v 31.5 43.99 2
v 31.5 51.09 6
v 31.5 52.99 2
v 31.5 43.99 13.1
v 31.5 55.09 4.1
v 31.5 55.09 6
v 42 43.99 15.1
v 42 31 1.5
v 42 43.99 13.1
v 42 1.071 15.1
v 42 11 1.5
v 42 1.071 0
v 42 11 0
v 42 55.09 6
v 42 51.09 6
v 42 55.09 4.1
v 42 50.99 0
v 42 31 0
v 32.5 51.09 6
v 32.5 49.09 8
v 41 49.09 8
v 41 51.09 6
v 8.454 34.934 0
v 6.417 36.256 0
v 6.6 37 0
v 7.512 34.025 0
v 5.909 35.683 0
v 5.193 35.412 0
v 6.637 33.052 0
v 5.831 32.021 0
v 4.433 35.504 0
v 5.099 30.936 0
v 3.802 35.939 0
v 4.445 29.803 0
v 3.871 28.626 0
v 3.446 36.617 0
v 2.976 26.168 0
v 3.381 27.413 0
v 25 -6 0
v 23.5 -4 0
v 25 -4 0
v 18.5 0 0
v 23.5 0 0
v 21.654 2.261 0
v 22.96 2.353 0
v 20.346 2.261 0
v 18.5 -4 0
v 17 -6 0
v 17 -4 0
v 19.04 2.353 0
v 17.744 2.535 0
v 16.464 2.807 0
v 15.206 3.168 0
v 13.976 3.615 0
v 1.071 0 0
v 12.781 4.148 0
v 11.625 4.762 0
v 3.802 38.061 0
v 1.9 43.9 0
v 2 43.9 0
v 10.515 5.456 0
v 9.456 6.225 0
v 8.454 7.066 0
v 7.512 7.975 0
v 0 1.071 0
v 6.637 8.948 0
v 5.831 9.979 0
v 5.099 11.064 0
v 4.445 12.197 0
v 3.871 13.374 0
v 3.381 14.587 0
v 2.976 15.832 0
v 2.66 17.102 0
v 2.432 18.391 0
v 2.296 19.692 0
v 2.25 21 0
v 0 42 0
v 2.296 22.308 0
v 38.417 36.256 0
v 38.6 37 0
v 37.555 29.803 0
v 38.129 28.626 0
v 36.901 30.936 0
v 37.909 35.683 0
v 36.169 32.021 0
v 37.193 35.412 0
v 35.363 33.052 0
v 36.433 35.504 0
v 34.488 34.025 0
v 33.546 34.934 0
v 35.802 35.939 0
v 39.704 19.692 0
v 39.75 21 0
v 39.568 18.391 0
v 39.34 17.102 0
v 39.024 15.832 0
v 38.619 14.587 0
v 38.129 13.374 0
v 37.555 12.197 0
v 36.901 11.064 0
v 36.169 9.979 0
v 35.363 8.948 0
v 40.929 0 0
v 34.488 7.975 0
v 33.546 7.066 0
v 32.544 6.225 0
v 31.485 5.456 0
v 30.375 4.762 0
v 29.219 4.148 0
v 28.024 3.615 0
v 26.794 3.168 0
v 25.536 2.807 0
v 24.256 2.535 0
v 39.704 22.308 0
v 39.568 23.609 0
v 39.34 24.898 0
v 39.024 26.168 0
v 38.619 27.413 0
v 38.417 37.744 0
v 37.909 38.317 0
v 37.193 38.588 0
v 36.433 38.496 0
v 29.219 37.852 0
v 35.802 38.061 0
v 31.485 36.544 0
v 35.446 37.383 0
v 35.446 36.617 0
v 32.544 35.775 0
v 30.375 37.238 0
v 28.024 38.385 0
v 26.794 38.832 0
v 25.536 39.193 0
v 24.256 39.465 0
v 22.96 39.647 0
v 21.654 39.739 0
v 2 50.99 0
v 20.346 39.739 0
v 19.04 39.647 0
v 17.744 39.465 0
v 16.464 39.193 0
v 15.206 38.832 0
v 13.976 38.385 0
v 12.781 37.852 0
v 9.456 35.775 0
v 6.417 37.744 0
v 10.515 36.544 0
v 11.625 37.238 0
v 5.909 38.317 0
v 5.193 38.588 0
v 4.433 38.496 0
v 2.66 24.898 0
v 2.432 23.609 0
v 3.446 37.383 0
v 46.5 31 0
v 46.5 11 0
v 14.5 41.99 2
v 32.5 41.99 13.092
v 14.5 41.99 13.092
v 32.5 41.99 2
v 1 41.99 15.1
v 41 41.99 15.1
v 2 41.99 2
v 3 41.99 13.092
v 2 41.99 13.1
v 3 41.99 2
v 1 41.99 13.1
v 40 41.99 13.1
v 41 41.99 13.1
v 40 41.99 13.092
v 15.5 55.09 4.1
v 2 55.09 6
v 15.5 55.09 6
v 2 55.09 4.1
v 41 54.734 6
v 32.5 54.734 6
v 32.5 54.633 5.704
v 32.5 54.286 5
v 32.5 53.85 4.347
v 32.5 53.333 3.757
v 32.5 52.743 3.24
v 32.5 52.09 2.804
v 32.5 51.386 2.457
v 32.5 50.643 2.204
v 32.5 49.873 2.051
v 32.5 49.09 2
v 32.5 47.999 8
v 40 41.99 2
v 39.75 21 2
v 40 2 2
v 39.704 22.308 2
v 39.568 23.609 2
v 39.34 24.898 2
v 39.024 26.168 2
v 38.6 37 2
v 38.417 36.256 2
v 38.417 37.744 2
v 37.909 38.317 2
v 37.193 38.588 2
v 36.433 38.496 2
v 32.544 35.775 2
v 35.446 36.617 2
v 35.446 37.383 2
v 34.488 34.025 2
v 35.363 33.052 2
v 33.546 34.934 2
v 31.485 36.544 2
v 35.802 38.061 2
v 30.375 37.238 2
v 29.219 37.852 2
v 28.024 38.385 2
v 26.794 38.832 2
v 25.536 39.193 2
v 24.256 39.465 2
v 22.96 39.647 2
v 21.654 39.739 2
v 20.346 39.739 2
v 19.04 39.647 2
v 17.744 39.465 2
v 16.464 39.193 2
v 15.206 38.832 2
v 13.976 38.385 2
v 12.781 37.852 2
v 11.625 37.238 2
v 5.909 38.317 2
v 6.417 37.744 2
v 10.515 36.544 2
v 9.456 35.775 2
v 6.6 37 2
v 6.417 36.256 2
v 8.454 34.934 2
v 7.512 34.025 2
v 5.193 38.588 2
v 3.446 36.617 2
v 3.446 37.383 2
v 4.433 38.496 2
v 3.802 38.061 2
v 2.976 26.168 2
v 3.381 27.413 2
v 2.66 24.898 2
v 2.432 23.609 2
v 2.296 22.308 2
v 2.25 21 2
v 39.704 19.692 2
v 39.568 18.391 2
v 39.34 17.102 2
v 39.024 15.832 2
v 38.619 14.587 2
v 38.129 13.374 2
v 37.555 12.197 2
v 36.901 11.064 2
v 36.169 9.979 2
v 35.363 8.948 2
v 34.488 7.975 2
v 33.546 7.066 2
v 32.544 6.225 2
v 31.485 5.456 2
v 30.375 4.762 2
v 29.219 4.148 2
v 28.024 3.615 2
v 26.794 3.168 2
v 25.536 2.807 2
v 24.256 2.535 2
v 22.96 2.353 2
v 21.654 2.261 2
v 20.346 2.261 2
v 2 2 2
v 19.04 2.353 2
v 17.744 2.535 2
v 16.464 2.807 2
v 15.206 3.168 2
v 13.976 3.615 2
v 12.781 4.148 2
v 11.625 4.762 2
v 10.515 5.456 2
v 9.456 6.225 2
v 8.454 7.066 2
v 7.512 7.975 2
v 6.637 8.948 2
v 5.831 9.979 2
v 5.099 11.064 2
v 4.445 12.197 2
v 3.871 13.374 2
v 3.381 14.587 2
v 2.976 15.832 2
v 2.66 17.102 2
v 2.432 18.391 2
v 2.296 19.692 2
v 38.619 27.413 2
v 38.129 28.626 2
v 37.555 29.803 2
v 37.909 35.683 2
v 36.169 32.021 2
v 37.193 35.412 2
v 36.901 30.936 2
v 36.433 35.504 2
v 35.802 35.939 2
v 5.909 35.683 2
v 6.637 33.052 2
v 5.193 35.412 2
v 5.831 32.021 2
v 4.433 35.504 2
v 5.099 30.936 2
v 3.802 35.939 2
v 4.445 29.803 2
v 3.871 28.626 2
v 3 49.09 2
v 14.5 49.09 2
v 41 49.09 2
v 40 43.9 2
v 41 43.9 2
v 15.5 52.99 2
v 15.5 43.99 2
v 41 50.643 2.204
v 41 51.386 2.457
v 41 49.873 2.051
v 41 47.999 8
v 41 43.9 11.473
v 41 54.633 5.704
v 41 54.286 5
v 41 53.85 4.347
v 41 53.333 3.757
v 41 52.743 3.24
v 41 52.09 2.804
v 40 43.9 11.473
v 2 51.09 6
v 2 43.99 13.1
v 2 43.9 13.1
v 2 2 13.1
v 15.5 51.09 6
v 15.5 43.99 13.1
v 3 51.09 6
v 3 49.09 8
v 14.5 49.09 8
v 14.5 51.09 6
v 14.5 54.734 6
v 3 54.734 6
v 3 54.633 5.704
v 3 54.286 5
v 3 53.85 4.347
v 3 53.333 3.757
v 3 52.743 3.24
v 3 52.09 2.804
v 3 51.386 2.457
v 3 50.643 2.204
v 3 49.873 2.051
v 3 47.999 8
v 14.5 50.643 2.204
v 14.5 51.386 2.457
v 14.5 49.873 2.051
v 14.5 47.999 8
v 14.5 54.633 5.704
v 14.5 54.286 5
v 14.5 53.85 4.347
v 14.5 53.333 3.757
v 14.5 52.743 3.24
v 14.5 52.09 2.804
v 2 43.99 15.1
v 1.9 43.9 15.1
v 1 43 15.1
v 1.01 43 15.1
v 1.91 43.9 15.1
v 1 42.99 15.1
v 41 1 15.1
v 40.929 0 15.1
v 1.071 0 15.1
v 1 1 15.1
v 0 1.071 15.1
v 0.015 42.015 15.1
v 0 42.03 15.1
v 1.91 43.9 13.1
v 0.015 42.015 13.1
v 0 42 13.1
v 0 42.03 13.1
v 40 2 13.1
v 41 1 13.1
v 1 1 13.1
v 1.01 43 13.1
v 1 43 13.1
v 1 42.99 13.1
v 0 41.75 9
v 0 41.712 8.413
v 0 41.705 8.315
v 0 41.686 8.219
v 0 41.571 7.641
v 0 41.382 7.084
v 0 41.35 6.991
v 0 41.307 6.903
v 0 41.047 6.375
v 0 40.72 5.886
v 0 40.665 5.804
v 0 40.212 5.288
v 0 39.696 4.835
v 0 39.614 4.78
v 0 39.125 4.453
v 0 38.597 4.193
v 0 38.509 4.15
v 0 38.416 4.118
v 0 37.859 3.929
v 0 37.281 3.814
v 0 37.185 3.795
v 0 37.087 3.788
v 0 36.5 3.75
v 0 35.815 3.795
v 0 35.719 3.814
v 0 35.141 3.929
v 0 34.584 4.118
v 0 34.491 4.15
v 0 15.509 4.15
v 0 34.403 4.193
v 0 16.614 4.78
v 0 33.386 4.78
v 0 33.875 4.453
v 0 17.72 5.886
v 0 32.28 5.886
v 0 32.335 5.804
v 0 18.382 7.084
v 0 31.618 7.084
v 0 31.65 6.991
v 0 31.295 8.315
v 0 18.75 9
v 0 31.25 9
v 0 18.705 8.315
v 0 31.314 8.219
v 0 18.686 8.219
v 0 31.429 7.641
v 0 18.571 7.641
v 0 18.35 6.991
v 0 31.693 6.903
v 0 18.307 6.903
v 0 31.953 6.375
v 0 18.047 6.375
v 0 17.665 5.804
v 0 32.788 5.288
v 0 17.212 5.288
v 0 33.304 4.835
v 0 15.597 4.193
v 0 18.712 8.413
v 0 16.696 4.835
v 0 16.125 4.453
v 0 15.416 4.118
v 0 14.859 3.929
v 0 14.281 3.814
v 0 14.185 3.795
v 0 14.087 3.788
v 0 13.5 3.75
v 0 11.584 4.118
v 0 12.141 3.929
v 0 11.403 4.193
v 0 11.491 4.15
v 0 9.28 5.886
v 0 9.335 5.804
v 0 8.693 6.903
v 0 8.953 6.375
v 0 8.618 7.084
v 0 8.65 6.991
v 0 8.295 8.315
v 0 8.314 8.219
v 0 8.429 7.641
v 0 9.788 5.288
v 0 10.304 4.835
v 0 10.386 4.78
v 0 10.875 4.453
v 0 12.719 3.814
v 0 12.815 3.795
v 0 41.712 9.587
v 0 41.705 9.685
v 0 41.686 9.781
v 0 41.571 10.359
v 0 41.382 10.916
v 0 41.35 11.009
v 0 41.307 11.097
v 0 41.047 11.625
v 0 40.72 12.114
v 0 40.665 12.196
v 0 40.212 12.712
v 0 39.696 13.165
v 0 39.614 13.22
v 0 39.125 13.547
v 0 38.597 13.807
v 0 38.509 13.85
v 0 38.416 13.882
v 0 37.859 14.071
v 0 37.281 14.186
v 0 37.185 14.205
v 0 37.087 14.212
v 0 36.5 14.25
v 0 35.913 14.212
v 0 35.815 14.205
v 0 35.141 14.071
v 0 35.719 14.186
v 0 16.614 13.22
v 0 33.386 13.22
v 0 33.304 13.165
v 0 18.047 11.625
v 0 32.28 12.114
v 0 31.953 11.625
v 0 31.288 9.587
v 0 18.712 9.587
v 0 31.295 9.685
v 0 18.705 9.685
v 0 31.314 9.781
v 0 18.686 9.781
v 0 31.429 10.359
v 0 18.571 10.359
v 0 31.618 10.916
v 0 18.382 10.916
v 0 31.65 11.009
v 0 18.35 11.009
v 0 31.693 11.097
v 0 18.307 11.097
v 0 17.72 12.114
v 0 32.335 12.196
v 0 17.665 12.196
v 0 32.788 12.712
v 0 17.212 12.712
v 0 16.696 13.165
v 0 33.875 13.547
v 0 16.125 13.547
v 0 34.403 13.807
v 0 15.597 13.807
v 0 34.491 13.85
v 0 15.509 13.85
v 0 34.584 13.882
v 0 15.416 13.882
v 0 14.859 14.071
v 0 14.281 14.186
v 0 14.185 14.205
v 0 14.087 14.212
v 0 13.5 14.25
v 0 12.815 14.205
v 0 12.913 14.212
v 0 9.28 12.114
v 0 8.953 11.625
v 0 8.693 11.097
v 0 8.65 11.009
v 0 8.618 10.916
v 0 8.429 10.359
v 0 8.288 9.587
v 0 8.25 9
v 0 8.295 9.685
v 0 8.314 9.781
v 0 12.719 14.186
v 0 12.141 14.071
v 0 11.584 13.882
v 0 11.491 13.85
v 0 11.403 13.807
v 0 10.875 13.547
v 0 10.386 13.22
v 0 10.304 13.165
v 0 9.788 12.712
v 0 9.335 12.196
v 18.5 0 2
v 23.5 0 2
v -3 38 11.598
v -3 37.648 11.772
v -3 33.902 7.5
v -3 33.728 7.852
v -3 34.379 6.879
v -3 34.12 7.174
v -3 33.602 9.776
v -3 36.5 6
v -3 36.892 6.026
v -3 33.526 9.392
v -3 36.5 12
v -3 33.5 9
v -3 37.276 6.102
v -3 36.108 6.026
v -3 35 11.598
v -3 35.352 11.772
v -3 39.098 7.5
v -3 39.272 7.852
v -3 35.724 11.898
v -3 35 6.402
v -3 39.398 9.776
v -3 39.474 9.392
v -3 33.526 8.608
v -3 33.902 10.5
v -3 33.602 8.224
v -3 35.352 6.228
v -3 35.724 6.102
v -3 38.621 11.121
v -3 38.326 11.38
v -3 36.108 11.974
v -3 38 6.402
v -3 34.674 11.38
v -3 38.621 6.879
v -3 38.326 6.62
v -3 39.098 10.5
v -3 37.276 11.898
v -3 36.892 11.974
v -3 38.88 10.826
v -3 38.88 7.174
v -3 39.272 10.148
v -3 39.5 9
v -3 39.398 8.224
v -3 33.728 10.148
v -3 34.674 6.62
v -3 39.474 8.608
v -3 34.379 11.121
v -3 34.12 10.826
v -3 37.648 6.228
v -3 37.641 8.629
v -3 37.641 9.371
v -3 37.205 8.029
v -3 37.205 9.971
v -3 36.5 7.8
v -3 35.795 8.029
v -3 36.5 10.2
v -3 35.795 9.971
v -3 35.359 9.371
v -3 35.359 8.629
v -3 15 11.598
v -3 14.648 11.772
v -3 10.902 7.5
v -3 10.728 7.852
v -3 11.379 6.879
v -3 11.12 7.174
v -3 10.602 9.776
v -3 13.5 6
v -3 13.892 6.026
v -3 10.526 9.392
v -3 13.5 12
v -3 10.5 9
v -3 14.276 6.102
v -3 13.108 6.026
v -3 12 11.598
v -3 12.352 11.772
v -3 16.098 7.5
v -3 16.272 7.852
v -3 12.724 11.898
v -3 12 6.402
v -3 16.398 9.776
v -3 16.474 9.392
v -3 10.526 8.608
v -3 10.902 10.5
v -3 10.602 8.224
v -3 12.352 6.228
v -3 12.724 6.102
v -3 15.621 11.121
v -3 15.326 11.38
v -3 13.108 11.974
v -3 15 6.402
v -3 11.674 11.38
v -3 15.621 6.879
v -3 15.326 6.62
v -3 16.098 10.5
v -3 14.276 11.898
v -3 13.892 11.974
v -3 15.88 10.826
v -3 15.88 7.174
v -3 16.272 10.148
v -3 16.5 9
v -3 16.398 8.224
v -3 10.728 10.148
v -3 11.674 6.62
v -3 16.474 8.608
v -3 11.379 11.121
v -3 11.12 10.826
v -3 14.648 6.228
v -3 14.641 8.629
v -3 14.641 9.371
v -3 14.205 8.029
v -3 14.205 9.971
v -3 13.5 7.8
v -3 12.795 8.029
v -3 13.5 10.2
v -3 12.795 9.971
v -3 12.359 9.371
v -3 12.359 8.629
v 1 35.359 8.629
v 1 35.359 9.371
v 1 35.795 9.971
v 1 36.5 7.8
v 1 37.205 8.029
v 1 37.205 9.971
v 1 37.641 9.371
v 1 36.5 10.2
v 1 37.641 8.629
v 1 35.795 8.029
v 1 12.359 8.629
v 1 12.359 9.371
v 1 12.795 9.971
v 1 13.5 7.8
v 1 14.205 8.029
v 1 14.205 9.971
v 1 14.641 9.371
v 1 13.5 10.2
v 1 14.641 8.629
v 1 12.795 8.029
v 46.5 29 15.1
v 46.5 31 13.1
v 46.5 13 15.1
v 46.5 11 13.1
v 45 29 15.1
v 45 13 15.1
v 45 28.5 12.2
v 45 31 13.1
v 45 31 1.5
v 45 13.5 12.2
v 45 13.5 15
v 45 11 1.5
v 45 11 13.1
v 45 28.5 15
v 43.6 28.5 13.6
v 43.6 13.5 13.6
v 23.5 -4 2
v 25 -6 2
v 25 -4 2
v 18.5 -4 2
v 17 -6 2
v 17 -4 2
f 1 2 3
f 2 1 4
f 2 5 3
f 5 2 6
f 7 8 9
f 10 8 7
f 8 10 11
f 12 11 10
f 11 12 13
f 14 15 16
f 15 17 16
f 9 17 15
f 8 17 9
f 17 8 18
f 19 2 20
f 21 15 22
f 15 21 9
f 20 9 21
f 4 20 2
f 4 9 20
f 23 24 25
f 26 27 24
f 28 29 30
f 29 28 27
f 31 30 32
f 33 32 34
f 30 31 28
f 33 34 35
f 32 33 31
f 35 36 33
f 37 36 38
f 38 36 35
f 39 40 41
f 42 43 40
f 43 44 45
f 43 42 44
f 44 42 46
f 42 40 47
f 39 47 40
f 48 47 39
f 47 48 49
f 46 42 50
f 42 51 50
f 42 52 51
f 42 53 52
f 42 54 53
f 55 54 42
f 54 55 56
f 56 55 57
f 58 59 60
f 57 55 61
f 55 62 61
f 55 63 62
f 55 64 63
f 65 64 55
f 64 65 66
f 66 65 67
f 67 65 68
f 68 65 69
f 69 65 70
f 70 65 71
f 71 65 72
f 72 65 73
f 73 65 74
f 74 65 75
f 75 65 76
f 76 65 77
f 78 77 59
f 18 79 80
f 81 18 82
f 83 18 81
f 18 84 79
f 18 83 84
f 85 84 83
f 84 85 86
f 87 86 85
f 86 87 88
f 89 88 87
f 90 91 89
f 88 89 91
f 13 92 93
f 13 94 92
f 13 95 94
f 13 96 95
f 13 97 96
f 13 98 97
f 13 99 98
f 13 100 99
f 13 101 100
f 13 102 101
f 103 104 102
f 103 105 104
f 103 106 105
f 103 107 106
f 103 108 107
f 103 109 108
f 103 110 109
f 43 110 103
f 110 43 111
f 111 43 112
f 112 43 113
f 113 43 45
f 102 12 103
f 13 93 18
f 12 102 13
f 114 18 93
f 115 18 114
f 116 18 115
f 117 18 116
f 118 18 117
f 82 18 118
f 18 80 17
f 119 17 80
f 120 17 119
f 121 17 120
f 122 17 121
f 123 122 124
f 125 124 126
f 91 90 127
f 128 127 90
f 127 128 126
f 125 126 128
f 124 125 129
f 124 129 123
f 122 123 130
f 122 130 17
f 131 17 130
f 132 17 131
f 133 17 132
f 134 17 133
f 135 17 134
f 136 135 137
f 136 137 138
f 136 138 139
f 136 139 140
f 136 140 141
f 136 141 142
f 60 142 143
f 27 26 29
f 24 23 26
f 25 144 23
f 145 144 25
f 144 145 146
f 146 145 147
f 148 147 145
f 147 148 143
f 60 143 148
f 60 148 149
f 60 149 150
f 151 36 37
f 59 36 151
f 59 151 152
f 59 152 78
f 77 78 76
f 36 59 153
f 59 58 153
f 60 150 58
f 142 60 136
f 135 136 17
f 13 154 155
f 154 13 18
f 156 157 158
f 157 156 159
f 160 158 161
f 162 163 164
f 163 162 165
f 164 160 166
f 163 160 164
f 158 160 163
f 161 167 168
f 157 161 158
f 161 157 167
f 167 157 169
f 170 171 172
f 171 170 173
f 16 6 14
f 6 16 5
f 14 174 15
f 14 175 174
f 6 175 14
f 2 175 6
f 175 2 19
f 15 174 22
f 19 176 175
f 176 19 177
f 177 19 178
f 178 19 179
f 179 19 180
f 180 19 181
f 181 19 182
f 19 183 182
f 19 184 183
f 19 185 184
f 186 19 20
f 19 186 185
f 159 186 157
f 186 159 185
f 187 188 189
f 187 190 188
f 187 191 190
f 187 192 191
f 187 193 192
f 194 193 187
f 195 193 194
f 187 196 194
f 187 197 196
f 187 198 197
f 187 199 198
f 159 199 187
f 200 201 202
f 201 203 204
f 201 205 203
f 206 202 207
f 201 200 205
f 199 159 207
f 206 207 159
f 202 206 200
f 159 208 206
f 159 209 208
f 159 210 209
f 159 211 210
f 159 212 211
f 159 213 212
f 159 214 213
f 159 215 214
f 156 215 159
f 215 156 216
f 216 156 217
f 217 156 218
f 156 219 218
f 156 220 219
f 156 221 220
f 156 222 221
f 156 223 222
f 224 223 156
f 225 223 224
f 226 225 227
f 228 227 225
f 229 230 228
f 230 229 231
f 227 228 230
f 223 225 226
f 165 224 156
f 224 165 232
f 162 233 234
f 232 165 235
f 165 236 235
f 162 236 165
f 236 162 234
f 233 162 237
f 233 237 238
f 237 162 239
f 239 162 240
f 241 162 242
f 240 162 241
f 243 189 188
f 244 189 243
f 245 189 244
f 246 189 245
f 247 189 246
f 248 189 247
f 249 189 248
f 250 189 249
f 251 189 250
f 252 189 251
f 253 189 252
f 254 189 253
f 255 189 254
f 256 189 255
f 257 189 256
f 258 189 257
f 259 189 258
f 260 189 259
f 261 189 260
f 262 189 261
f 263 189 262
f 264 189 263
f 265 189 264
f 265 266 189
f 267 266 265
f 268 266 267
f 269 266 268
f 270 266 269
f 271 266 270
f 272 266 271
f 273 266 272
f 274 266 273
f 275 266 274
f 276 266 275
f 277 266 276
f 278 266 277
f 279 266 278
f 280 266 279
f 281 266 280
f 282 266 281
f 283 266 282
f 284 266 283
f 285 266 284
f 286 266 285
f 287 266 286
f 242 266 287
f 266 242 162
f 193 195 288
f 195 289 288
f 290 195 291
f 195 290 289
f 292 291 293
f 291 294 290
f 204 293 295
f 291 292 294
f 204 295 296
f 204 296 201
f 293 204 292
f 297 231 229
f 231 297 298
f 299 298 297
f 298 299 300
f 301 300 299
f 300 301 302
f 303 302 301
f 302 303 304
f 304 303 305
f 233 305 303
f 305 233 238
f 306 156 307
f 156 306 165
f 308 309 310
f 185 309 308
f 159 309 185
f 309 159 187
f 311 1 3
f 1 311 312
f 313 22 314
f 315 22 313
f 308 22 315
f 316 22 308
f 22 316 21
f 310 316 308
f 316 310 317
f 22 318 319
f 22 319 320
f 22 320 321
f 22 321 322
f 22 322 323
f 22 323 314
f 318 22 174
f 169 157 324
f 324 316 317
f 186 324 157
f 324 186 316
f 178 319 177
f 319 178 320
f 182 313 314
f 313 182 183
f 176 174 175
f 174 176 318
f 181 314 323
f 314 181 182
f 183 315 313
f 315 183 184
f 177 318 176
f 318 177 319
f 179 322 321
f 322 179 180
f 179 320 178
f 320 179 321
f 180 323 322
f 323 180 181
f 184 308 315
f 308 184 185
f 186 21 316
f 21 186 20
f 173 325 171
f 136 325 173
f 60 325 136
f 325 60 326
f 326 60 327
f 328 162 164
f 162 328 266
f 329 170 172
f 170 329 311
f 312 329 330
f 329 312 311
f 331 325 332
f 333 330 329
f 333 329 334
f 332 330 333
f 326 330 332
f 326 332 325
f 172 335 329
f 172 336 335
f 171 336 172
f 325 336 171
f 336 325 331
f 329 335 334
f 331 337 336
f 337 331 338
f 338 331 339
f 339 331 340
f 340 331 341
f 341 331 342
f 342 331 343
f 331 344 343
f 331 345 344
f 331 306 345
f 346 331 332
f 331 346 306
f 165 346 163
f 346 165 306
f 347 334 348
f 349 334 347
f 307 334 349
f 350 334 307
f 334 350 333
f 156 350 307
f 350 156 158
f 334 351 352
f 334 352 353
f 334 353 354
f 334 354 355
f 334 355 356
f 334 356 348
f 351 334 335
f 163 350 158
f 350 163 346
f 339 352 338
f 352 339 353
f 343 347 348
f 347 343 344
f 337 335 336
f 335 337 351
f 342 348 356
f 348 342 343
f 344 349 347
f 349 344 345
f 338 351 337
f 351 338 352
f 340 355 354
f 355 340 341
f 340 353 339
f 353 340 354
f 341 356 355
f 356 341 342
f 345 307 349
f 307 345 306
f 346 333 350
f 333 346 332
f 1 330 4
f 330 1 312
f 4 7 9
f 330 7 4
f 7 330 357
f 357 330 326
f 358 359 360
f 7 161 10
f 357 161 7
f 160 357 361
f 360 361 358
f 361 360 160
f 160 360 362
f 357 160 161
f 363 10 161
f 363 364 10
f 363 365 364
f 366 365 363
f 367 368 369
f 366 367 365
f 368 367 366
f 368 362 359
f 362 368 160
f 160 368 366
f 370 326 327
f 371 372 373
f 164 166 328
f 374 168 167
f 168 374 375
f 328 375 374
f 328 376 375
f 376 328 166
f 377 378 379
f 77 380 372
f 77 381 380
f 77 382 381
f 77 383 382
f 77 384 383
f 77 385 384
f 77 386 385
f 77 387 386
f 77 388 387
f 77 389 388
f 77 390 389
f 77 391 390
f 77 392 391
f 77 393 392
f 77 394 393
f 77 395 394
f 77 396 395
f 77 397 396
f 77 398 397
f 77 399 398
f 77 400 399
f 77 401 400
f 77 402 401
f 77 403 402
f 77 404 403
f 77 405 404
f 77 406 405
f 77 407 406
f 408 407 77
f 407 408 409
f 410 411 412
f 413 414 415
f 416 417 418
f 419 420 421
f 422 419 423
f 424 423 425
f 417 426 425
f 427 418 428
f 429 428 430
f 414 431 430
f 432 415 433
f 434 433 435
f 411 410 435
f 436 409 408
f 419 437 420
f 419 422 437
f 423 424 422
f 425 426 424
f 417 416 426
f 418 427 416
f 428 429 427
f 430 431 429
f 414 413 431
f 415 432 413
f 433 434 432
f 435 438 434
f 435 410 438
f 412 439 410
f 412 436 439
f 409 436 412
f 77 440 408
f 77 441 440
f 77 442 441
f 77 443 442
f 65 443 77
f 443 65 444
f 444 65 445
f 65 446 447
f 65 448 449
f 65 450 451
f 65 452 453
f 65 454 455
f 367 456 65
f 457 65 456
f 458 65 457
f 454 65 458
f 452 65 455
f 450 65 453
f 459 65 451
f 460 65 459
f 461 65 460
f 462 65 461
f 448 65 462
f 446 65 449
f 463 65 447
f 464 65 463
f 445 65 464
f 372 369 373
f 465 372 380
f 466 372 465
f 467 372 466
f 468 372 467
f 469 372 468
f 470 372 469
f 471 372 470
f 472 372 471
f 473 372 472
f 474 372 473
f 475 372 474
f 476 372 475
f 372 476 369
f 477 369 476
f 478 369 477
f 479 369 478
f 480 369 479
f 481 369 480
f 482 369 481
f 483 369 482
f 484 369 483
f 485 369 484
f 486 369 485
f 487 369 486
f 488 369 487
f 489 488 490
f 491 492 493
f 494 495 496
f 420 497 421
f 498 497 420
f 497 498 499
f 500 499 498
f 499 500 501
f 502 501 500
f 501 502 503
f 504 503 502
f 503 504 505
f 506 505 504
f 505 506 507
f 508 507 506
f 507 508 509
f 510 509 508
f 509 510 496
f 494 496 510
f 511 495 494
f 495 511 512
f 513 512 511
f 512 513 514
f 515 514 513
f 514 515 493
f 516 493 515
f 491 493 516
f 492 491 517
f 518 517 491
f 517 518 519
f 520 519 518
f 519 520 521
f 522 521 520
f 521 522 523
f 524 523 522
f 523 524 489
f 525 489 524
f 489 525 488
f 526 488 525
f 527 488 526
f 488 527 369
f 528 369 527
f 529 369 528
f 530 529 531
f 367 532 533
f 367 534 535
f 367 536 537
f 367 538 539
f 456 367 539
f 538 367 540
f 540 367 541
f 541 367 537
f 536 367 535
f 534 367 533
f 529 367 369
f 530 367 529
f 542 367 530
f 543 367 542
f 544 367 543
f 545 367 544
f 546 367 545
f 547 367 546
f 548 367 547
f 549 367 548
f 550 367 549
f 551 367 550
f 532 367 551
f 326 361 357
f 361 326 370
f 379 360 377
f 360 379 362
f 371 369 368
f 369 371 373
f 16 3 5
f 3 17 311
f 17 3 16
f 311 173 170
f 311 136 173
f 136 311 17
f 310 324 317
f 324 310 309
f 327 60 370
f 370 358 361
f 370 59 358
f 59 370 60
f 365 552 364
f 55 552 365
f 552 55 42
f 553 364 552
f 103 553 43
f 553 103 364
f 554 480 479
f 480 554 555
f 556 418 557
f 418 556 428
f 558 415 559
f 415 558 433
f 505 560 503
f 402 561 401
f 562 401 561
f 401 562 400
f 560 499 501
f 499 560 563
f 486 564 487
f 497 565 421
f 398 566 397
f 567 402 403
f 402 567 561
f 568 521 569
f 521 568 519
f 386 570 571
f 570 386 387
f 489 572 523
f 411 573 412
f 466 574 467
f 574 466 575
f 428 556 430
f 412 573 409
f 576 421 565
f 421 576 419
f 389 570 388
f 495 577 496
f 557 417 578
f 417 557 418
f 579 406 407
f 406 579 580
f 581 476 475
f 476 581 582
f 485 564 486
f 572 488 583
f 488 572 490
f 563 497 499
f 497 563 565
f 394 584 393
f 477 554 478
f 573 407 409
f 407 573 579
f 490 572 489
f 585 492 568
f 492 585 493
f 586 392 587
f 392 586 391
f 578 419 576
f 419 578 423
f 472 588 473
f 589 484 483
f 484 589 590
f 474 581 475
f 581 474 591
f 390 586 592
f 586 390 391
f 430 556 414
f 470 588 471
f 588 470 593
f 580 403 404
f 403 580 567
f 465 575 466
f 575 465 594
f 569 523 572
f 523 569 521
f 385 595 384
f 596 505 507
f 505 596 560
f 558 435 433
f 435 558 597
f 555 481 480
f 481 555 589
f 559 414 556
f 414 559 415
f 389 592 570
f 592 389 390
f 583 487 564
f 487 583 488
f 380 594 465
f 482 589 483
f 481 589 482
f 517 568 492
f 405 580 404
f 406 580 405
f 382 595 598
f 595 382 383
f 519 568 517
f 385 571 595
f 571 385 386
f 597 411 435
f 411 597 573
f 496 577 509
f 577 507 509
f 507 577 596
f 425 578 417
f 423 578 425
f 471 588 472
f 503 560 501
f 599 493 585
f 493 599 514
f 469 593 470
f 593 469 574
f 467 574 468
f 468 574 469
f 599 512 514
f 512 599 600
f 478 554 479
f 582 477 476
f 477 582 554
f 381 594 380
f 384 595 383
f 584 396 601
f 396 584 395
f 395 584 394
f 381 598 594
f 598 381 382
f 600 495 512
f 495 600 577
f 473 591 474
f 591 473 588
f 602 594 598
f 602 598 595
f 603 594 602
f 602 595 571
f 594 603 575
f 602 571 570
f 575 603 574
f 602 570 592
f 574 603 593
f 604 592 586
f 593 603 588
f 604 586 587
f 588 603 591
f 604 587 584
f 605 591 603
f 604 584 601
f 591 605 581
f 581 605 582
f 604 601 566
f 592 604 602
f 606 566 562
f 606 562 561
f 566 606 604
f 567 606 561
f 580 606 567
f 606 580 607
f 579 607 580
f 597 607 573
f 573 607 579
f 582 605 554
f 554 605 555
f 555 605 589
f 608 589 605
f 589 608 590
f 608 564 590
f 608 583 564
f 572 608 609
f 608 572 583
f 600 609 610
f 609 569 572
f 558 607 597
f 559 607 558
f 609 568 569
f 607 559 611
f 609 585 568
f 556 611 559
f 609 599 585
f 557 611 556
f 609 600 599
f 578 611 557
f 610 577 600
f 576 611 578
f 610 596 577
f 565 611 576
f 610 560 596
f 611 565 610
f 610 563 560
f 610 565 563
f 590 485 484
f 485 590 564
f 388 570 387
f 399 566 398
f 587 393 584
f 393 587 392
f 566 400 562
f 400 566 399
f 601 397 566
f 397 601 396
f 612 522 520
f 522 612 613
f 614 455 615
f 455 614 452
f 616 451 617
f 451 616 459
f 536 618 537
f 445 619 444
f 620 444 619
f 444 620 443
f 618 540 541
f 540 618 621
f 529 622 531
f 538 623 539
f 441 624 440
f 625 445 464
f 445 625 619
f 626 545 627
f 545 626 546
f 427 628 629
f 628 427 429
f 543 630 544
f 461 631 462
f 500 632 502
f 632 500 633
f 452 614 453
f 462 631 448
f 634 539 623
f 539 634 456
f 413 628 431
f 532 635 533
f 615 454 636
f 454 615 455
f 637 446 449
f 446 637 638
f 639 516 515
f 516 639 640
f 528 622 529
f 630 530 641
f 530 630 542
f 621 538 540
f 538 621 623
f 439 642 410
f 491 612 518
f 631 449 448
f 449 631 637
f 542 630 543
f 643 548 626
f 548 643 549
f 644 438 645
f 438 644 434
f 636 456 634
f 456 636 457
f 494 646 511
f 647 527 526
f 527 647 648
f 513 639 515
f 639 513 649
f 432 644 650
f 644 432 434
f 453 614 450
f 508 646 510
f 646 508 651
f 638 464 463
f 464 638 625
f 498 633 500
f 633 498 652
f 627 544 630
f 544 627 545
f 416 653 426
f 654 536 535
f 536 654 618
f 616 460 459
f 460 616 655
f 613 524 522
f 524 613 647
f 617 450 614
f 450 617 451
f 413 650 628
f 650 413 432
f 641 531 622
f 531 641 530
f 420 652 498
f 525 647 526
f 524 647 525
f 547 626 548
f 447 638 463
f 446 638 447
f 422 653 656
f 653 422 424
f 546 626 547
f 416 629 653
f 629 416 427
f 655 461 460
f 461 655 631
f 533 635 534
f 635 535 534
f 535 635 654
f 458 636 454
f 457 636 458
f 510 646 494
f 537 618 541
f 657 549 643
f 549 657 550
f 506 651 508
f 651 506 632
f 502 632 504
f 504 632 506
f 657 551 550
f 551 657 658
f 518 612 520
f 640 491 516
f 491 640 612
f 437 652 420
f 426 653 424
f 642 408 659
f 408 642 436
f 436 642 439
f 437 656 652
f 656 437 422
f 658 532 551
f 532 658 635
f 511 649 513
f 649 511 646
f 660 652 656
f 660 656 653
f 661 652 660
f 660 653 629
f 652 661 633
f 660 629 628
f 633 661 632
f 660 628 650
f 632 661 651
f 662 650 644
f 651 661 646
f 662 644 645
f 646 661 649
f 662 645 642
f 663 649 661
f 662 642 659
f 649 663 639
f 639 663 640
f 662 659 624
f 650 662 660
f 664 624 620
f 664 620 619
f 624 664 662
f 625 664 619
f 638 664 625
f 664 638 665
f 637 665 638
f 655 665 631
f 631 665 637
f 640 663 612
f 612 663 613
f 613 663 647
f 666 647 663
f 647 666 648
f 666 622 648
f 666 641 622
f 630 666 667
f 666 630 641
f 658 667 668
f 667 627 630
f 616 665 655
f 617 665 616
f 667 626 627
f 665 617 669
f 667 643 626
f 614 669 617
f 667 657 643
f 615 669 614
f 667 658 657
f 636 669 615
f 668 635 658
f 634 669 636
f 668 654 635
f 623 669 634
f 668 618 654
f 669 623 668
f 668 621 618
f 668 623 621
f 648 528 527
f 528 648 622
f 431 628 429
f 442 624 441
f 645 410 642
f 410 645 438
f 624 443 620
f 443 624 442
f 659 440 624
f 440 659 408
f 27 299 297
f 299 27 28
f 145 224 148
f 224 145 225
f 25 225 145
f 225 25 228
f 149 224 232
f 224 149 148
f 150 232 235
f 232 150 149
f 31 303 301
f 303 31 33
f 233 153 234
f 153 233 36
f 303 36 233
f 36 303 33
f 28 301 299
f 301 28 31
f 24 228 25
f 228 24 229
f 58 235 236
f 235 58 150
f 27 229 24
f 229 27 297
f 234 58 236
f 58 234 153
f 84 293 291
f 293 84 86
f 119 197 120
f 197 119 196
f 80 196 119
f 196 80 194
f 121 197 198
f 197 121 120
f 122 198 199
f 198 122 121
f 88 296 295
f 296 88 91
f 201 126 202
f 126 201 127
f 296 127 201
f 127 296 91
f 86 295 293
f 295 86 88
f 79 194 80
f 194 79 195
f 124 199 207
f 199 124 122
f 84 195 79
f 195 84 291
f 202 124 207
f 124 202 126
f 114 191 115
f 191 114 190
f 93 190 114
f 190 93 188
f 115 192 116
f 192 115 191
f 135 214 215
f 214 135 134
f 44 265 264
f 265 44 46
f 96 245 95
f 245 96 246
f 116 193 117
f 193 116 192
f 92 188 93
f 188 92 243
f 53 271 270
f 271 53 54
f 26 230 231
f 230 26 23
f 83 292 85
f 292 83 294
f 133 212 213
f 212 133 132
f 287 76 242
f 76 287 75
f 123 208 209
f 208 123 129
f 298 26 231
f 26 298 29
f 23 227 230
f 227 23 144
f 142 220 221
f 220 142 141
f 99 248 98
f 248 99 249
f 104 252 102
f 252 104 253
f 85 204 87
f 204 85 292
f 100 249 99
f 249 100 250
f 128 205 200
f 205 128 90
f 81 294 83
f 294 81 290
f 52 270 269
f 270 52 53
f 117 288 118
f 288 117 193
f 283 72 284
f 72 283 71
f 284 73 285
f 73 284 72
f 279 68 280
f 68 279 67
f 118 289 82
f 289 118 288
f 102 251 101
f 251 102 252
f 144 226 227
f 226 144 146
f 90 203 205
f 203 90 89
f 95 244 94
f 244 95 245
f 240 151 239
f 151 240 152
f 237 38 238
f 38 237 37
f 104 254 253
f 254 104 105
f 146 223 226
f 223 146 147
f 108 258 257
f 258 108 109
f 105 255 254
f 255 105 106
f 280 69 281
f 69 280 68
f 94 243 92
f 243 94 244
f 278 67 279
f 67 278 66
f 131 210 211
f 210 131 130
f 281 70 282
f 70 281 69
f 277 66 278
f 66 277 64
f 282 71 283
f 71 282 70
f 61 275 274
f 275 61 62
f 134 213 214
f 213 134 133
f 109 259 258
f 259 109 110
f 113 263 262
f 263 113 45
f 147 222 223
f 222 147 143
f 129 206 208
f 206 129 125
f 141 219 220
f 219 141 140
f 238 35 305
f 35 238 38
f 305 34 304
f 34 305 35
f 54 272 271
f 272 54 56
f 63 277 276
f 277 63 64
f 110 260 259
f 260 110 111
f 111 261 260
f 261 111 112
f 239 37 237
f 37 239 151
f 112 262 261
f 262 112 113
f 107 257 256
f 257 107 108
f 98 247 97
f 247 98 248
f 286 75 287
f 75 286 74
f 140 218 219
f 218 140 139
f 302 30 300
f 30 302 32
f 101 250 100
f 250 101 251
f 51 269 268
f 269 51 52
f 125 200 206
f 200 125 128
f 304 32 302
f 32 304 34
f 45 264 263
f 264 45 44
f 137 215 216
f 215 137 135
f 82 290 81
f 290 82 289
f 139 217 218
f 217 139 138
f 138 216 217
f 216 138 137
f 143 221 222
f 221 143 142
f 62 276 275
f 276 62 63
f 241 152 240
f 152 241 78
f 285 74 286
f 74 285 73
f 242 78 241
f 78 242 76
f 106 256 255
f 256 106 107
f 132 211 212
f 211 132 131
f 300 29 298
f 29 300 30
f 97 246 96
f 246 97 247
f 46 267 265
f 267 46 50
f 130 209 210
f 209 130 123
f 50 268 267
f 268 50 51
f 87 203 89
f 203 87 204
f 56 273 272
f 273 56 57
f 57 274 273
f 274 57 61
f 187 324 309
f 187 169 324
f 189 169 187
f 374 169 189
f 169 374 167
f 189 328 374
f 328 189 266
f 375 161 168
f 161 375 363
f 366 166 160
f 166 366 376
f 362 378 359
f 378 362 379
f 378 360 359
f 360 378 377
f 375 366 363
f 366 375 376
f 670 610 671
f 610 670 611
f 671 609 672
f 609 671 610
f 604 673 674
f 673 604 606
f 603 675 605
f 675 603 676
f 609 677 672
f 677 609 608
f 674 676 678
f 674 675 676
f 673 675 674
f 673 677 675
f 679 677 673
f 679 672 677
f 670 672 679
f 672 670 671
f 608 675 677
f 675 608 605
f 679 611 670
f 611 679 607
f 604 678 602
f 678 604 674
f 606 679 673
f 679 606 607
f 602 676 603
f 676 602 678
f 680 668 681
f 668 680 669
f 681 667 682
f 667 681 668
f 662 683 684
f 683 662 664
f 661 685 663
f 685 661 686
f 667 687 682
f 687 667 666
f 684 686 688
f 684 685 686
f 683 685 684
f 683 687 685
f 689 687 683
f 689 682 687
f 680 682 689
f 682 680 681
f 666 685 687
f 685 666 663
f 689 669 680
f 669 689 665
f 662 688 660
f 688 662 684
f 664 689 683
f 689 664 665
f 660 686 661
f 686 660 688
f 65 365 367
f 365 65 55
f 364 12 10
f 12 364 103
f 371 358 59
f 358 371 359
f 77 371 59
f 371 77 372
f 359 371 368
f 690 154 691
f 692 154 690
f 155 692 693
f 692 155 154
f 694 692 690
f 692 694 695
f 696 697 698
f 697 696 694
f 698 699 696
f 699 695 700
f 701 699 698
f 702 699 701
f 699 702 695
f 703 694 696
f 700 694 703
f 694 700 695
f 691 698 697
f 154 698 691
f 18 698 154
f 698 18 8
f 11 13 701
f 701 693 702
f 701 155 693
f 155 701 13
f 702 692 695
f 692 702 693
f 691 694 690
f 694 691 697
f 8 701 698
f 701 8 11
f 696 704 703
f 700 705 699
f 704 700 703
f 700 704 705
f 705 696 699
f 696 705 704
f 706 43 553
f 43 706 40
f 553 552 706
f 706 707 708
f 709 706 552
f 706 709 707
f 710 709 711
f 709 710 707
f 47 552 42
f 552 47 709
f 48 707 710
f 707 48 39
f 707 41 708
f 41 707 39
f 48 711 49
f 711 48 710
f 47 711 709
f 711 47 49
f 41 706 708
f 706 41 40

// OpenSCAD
$fs=0.8; // def 1, 0.2 is high res
$fa=4;//def 12, 3 is very nice
%translate([0,0,-0.5])cube([200,200,1],center=true); //build platform

sc = 32; //Screw Centres
wall=2;
hole = 37.5;  //fan hole
x=42;
y=x;
z=15.10;
heo = 2.5; //hot end offset
hbr = 16; //heat block recess

size=11; // size of the ball joint
joint_spacing =0; // some space between them?
joint_thickness = 3; // thickness of the arms - was 2
joint_arms = 2; // how many arms do you want?
arm_width = 5; // actually: how much is removed from the arms Larger values will remove more - was 10

ventB=(x/2)-(hbr/2)+heo-2;
ventS=(x/2)-(hbr/2)-heo;

module ball() {
	sphere(r=size);
	translate([0,0,-size]) cylinder(r1=8,r2=6,h=3);
	translate([0,0,-size-3]) cylinder(r=8,h=3);
}

module joint() {
	difference() 	{
		sphere(r=size+joint_spacing+joint_thickness);
		sphere(r=size+joint_spacing);
		translate([0,0,-size-3]) cube([size+joint_spacing+joint_thickness+25,size+joint_spacing+joint_thickness+25,18],center=true);
		for(i=[0:joint_arms])
		{
			rotate([0,0,360/joint_arms*i]) translate([-arm_width/2,0, -size/2-4])
				cube([arm_width,size+joint_spacing+joint_thickness+20,size+6]);
		}
	}
	translate([0,0,size-0]) cylinder(r2=12,r1=12,h=5);

}

module prism(l, w, h) {
	translate([0, l, 0]) rotate( a= [90, 0, 0]) 
	linear_extrude(height = l) polygon(points = [
		[0, 0],
		[w, 0],
		[0, h]
	], paths=[[0,2,1]]);
}

module vHole(len) {
	difference() {
		union() {
			cube([10-6,len,6]);
			translate([10-6,len,6]) rotate([90,0,0]) cylinder(len,6,6);
		}
		translate ([-7,-1,6]) cube([16,len+2,10]);
		translate ([-7,-1,0]) cube([6,len+2,7]);
	}
}

//Vents
translate([x,y-0.01,0]) rotate([0,0,90]) {
	difference() {
		union() {
			difference() { //Small Vent
				union() {
					prism(ventS,z,z);
					translate([z-6,0,0]) cube([4,ventS,6]); //tip
				}
				difference() {
					translate([-.01,wall/2,wall]) prism(ventS-wall,z-wall, z-wall*2);
					translate([6,0,0]) cube([6,ventS,6]);
				}
				translate([z-12,wall-1,wall]) vHole(ventS-(wall));
			}

			translate([0,ventS+hbr,0]) { 
				difference() { //Big Vent
					union() {
						prism(ventB,z,z);
						translate([z-6,0,0]) cube([4,ventB,6]);
					}
					difference() {
						translate([-.01,wall/2,wall]) prism(ventB-wall,z-wall,z-wall*2);
						translate([6,0,0]) cube([6,ventB,6]);
					}
					translate([z-12,wall-1,wall]) vHole(ventB-(wall));
				}
			}
			
			cube([z-2,y-2,wall]); //vent Base
			translate([0,ventS,wall]) cube([wall,hbr,z-(wall*2)]); //vent join			
			
			difference() {
				translate([0,0,z-wall]) cube([wall,y,wall]); //top of slope edging strip
				translate([2,y-2,-1]) rotate([0,0,45]) cube([2.8,2.8,z+2]); //bottom right bevel
			}
		}
		translate([9,-1,0]) rotate([0,45,0]) cube([10,y+2,10]); //vent bottom bevel
	}
}

//Body
difference() {
	union() {
		cube([x,y+1.9,z]); //outer block
	translate([-3,((x-sc)/2) + sc - 0.5,9]) rotate([0,90,0]) cylinder(4,3,6);	// sensor board mount
	translate([-3,((x-sc)/2) + sc - 23.5,9]) rotate([0,90,0]) cylinder(4,3,6);	// sensor board mount	

	}
	translate([x/2,x/2,-.1]) cylinder(20,hole/2,hole/2); //fan hole
	
	translate([wall,wall,2]) cube([x-(wall*2), x, 20]); //heatsink hole
	translate([wall-1,wall-1,z-2]) cube([x-(wall), x, 20]); //heatsink recess
	for(xp = [0:1]) { //2 x screw holes
		translate([((x-sc)/2) + (xp*sc),((x-sc)/2) + sc,-.1]) cylinder(3,1.6,1.6);
	}
	
	translate([-4,((x-sc)/2) + sc - 0.5,9]) rotate([0,90,0]) cylinder(h=5,r=1.2);	// sensor board hole
	translate([-4,((x-sc)/2) + sc - 23.5,9]) rotate([0,90,0]) cylinder(h=5,r=1.2);	// sensor board hole
	
	translate([0,-6,-1]) rotate([0,0,45]) cube([5,5,z+2]); // top bevel
	translate([x,-6,-1]) rotate([0,0,45]) cube([5,5,z+2]); //top bevel
	translate([0,y,-1]) rotate([0,0,45]) cube([2.7,2.7,z+2]); //bottom right bevel
}

//Cable Traps
translate([x,(y/2)-10,0]) cube([wall*2,20,1.5]); //right cable trap
difference() {
	translate([x+3,(y/2)-10,0]) cube([1.5,20,z]); //right cable trap
	translate([x+2,(y/2)-10,z-2]) rotate([45,0,0]) cube(3); //right cable trap bevel
	translate([x+2,y-11,z-2]) rotate([45,0,0]) cube(3); //right cable trap bevel
}
translate([x+1.6,(y/2)-7.5,z-1.5]) rotate([0,45,0]) cube([2,15,2]); //right cable trap catch


//Tie Wrap T
translate([x/2-2.5,-6,0]) cube([5,6,2]);
translate([x/2-4,-6,0]) cube([8,2,2]);

/*Ball Joint
difference() {
	union() {
		rotate([0,90,0]) scale(.5)  translate([-size+1,size,97]) ball();
		//translate([20,20,2.4]) scale(.5) joint();
	}
	translate([0,0,-6]) cube([100,100,6]);
	translate([20,20,2.4]) cylinder(20,1.5,1.5);
}
*/
